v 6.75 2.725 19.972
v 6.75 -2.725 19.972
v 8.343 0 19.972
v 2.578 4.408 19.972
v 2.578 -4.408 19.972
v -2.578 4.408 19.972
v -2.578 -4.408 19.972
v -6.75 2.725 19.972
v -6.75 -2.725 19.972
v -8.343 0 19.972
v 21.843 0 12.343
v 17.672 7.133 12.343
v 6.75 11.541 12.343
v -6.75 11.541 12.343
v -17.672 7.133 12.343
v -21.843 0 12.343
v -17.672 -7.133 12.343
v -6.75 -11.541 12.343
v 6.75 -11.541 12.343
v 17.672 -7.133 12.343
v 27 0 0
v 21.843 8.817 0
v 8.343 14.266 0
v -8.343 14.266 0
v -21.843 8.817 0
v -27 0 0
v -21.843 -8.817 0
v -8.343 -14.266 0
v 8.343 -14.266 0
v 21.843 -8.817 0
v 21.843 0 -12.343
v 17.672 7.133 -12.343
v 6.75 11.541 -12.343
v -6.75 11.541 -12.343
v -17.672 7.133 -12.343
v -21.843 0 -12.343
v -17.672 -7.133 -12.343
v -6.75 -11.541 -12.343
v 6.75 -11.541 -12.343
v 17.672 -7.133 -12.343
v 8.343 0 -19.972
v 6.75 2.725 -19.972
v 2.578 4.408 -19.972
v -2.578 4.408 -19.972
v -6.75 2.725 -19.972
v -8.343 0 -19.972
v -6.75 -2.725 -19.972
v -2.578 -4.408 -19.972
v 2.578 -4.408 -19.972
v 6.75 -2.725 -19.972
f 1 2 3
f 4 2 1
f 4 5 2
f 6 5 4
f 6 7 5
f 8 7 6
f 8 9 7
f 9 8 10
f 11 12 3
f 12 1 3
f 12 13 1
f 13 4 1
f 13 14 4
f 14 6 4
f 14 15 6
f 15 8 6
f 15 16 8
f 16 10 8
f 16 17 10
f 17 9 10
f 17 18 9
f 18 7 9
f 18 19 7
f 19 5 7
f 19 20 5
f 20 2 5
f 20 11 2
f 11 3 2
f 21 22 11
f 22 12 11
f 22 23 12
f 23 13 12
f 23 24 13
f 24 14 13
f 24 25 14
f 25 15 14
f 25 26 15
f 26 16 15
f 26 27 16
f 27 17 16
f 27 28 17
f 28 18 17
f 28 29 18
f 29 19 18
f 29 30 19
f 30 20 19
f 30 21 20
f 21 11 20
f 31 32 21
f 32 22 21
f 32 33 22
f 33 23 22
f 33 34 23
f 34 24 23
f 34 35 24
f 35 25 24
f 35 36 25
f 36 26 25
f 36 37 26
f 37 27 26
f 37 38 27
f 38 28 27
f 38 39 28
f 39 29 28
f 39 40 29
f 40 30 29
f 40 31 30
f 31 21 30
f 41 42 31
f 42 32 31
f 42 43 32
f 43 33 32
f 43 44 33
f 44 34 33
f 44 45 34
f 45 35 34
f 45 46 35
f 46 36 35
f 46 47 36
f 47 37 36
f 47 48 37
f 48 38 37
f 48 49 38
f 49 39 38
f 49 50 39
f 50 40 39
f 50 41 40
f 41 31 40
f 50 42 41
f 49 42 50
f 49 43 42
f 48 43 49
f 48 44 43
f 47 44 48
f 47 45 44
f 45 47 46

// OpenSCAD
// Generated by SolidPython 1.0.1 on 2020-07-29 00:46:48


scale(v = [9, 5, 7]) {
	sphere(r = 3);
}
/***********************************************
*********      SolidPython code:      **********
************************************************
 
# import packages: SolidPython
from solid import *
from solid.utils import *
from itertools import chain, combinations, permutations


class Resize:

    def __init__(self, scad_file):
        self.scad_file = scad_file
        #self.scad_file = import_scad(scad_file)
        # cone/cylinder param:
        self.r1 = 0
        self.r2 = 0
        self.h = 0
        # rectangular prism param:
        self.w = 0
        self.l = 0
        # ellipse param:
        self.r = 0

    # import OpenScad code (file name corresponds to shape)


    # classify shape + parameters
    def assign(self, param1, param2, param3):
        if self.scad_file == 'cone.scad':
            self.r1 = param1
            self.r2 = param2
            self.h = param3
        elif self.scad_file == 'cylinder.scad':
            self.r1 = param1
            self.r2 = param2
            self.h = param3
        elif self.scad_file == 'rectangularPrism.scad':
            self.h = param1
            self.l = param2
            self.w = param3
        else:
            self.r = param1
            self.h = param2

    # resize parameters
    def iterate(self):
        x = range(3, 20, 2)
        i = 1
        if self.scad_file == 'cone.scad':
            tempList = list(permutations(x, 2))
            for temp in tempList:
                param1 = temp[0]
                param2 = temp[1]
                filepath = 'produced_scad_files/' + 'cone' + str(param1) + '_' + str(param2) + '_' + '.scad'
                scad_render_to_file(cylinder(h=param1, r1=param2, r2=0), filepath)

        elif self.scad_file == 'cylinder.scad':
            tempList = list(permutations(x, 3))
            for temp in tempList:
                param1 = temp[0]
                param2 = temp[1]
                filepath = 'produced_scad_files/' + 'cylinder' + str(param1) + '_' + str(param2) + '_' + '.scad'
                scad_render_to_file(cylinder(h=param1, r1=param2, r2=param2), filepath)

        elif self.scad_file == 'rectangularPrism.scad':
            tempList = list(permutations(x, 3))
            for temp in tempList:
                param1 = temp[0]
                param2 = temp[1]
                param3 = temp[2]
                filepath = 'produced_scad_files/' + 'rectangularPrism' + str(param1) + '_' + str(param2) + '_' + str(
                    param3) + '.scad'
                scad_render_to_file(cube(size=(param1, param2, param3)), filepath)

        elif self.scad_file == 'ellipse.scad':
            tempList = list(permutations(x, 4))
            for temp in tempList:
                param1 = temp[0]
                param2 = temp[1]
                param3 = temp[2]
                param4 = temp[3]
                filepath = 'produced_scad_files/' + 'ellipse' + str(param1) + '_' + str(param2) + '_' + str(param3) + '_' + str(param4) + '.scad'
                scad_render_to_file(scale([param1, param2, param3])(sphere(r=param4)), filepath)

    def render_to_scadfile(self):
        scad_render_to_file(scad, 'example.scad') 
 
************************************************/
